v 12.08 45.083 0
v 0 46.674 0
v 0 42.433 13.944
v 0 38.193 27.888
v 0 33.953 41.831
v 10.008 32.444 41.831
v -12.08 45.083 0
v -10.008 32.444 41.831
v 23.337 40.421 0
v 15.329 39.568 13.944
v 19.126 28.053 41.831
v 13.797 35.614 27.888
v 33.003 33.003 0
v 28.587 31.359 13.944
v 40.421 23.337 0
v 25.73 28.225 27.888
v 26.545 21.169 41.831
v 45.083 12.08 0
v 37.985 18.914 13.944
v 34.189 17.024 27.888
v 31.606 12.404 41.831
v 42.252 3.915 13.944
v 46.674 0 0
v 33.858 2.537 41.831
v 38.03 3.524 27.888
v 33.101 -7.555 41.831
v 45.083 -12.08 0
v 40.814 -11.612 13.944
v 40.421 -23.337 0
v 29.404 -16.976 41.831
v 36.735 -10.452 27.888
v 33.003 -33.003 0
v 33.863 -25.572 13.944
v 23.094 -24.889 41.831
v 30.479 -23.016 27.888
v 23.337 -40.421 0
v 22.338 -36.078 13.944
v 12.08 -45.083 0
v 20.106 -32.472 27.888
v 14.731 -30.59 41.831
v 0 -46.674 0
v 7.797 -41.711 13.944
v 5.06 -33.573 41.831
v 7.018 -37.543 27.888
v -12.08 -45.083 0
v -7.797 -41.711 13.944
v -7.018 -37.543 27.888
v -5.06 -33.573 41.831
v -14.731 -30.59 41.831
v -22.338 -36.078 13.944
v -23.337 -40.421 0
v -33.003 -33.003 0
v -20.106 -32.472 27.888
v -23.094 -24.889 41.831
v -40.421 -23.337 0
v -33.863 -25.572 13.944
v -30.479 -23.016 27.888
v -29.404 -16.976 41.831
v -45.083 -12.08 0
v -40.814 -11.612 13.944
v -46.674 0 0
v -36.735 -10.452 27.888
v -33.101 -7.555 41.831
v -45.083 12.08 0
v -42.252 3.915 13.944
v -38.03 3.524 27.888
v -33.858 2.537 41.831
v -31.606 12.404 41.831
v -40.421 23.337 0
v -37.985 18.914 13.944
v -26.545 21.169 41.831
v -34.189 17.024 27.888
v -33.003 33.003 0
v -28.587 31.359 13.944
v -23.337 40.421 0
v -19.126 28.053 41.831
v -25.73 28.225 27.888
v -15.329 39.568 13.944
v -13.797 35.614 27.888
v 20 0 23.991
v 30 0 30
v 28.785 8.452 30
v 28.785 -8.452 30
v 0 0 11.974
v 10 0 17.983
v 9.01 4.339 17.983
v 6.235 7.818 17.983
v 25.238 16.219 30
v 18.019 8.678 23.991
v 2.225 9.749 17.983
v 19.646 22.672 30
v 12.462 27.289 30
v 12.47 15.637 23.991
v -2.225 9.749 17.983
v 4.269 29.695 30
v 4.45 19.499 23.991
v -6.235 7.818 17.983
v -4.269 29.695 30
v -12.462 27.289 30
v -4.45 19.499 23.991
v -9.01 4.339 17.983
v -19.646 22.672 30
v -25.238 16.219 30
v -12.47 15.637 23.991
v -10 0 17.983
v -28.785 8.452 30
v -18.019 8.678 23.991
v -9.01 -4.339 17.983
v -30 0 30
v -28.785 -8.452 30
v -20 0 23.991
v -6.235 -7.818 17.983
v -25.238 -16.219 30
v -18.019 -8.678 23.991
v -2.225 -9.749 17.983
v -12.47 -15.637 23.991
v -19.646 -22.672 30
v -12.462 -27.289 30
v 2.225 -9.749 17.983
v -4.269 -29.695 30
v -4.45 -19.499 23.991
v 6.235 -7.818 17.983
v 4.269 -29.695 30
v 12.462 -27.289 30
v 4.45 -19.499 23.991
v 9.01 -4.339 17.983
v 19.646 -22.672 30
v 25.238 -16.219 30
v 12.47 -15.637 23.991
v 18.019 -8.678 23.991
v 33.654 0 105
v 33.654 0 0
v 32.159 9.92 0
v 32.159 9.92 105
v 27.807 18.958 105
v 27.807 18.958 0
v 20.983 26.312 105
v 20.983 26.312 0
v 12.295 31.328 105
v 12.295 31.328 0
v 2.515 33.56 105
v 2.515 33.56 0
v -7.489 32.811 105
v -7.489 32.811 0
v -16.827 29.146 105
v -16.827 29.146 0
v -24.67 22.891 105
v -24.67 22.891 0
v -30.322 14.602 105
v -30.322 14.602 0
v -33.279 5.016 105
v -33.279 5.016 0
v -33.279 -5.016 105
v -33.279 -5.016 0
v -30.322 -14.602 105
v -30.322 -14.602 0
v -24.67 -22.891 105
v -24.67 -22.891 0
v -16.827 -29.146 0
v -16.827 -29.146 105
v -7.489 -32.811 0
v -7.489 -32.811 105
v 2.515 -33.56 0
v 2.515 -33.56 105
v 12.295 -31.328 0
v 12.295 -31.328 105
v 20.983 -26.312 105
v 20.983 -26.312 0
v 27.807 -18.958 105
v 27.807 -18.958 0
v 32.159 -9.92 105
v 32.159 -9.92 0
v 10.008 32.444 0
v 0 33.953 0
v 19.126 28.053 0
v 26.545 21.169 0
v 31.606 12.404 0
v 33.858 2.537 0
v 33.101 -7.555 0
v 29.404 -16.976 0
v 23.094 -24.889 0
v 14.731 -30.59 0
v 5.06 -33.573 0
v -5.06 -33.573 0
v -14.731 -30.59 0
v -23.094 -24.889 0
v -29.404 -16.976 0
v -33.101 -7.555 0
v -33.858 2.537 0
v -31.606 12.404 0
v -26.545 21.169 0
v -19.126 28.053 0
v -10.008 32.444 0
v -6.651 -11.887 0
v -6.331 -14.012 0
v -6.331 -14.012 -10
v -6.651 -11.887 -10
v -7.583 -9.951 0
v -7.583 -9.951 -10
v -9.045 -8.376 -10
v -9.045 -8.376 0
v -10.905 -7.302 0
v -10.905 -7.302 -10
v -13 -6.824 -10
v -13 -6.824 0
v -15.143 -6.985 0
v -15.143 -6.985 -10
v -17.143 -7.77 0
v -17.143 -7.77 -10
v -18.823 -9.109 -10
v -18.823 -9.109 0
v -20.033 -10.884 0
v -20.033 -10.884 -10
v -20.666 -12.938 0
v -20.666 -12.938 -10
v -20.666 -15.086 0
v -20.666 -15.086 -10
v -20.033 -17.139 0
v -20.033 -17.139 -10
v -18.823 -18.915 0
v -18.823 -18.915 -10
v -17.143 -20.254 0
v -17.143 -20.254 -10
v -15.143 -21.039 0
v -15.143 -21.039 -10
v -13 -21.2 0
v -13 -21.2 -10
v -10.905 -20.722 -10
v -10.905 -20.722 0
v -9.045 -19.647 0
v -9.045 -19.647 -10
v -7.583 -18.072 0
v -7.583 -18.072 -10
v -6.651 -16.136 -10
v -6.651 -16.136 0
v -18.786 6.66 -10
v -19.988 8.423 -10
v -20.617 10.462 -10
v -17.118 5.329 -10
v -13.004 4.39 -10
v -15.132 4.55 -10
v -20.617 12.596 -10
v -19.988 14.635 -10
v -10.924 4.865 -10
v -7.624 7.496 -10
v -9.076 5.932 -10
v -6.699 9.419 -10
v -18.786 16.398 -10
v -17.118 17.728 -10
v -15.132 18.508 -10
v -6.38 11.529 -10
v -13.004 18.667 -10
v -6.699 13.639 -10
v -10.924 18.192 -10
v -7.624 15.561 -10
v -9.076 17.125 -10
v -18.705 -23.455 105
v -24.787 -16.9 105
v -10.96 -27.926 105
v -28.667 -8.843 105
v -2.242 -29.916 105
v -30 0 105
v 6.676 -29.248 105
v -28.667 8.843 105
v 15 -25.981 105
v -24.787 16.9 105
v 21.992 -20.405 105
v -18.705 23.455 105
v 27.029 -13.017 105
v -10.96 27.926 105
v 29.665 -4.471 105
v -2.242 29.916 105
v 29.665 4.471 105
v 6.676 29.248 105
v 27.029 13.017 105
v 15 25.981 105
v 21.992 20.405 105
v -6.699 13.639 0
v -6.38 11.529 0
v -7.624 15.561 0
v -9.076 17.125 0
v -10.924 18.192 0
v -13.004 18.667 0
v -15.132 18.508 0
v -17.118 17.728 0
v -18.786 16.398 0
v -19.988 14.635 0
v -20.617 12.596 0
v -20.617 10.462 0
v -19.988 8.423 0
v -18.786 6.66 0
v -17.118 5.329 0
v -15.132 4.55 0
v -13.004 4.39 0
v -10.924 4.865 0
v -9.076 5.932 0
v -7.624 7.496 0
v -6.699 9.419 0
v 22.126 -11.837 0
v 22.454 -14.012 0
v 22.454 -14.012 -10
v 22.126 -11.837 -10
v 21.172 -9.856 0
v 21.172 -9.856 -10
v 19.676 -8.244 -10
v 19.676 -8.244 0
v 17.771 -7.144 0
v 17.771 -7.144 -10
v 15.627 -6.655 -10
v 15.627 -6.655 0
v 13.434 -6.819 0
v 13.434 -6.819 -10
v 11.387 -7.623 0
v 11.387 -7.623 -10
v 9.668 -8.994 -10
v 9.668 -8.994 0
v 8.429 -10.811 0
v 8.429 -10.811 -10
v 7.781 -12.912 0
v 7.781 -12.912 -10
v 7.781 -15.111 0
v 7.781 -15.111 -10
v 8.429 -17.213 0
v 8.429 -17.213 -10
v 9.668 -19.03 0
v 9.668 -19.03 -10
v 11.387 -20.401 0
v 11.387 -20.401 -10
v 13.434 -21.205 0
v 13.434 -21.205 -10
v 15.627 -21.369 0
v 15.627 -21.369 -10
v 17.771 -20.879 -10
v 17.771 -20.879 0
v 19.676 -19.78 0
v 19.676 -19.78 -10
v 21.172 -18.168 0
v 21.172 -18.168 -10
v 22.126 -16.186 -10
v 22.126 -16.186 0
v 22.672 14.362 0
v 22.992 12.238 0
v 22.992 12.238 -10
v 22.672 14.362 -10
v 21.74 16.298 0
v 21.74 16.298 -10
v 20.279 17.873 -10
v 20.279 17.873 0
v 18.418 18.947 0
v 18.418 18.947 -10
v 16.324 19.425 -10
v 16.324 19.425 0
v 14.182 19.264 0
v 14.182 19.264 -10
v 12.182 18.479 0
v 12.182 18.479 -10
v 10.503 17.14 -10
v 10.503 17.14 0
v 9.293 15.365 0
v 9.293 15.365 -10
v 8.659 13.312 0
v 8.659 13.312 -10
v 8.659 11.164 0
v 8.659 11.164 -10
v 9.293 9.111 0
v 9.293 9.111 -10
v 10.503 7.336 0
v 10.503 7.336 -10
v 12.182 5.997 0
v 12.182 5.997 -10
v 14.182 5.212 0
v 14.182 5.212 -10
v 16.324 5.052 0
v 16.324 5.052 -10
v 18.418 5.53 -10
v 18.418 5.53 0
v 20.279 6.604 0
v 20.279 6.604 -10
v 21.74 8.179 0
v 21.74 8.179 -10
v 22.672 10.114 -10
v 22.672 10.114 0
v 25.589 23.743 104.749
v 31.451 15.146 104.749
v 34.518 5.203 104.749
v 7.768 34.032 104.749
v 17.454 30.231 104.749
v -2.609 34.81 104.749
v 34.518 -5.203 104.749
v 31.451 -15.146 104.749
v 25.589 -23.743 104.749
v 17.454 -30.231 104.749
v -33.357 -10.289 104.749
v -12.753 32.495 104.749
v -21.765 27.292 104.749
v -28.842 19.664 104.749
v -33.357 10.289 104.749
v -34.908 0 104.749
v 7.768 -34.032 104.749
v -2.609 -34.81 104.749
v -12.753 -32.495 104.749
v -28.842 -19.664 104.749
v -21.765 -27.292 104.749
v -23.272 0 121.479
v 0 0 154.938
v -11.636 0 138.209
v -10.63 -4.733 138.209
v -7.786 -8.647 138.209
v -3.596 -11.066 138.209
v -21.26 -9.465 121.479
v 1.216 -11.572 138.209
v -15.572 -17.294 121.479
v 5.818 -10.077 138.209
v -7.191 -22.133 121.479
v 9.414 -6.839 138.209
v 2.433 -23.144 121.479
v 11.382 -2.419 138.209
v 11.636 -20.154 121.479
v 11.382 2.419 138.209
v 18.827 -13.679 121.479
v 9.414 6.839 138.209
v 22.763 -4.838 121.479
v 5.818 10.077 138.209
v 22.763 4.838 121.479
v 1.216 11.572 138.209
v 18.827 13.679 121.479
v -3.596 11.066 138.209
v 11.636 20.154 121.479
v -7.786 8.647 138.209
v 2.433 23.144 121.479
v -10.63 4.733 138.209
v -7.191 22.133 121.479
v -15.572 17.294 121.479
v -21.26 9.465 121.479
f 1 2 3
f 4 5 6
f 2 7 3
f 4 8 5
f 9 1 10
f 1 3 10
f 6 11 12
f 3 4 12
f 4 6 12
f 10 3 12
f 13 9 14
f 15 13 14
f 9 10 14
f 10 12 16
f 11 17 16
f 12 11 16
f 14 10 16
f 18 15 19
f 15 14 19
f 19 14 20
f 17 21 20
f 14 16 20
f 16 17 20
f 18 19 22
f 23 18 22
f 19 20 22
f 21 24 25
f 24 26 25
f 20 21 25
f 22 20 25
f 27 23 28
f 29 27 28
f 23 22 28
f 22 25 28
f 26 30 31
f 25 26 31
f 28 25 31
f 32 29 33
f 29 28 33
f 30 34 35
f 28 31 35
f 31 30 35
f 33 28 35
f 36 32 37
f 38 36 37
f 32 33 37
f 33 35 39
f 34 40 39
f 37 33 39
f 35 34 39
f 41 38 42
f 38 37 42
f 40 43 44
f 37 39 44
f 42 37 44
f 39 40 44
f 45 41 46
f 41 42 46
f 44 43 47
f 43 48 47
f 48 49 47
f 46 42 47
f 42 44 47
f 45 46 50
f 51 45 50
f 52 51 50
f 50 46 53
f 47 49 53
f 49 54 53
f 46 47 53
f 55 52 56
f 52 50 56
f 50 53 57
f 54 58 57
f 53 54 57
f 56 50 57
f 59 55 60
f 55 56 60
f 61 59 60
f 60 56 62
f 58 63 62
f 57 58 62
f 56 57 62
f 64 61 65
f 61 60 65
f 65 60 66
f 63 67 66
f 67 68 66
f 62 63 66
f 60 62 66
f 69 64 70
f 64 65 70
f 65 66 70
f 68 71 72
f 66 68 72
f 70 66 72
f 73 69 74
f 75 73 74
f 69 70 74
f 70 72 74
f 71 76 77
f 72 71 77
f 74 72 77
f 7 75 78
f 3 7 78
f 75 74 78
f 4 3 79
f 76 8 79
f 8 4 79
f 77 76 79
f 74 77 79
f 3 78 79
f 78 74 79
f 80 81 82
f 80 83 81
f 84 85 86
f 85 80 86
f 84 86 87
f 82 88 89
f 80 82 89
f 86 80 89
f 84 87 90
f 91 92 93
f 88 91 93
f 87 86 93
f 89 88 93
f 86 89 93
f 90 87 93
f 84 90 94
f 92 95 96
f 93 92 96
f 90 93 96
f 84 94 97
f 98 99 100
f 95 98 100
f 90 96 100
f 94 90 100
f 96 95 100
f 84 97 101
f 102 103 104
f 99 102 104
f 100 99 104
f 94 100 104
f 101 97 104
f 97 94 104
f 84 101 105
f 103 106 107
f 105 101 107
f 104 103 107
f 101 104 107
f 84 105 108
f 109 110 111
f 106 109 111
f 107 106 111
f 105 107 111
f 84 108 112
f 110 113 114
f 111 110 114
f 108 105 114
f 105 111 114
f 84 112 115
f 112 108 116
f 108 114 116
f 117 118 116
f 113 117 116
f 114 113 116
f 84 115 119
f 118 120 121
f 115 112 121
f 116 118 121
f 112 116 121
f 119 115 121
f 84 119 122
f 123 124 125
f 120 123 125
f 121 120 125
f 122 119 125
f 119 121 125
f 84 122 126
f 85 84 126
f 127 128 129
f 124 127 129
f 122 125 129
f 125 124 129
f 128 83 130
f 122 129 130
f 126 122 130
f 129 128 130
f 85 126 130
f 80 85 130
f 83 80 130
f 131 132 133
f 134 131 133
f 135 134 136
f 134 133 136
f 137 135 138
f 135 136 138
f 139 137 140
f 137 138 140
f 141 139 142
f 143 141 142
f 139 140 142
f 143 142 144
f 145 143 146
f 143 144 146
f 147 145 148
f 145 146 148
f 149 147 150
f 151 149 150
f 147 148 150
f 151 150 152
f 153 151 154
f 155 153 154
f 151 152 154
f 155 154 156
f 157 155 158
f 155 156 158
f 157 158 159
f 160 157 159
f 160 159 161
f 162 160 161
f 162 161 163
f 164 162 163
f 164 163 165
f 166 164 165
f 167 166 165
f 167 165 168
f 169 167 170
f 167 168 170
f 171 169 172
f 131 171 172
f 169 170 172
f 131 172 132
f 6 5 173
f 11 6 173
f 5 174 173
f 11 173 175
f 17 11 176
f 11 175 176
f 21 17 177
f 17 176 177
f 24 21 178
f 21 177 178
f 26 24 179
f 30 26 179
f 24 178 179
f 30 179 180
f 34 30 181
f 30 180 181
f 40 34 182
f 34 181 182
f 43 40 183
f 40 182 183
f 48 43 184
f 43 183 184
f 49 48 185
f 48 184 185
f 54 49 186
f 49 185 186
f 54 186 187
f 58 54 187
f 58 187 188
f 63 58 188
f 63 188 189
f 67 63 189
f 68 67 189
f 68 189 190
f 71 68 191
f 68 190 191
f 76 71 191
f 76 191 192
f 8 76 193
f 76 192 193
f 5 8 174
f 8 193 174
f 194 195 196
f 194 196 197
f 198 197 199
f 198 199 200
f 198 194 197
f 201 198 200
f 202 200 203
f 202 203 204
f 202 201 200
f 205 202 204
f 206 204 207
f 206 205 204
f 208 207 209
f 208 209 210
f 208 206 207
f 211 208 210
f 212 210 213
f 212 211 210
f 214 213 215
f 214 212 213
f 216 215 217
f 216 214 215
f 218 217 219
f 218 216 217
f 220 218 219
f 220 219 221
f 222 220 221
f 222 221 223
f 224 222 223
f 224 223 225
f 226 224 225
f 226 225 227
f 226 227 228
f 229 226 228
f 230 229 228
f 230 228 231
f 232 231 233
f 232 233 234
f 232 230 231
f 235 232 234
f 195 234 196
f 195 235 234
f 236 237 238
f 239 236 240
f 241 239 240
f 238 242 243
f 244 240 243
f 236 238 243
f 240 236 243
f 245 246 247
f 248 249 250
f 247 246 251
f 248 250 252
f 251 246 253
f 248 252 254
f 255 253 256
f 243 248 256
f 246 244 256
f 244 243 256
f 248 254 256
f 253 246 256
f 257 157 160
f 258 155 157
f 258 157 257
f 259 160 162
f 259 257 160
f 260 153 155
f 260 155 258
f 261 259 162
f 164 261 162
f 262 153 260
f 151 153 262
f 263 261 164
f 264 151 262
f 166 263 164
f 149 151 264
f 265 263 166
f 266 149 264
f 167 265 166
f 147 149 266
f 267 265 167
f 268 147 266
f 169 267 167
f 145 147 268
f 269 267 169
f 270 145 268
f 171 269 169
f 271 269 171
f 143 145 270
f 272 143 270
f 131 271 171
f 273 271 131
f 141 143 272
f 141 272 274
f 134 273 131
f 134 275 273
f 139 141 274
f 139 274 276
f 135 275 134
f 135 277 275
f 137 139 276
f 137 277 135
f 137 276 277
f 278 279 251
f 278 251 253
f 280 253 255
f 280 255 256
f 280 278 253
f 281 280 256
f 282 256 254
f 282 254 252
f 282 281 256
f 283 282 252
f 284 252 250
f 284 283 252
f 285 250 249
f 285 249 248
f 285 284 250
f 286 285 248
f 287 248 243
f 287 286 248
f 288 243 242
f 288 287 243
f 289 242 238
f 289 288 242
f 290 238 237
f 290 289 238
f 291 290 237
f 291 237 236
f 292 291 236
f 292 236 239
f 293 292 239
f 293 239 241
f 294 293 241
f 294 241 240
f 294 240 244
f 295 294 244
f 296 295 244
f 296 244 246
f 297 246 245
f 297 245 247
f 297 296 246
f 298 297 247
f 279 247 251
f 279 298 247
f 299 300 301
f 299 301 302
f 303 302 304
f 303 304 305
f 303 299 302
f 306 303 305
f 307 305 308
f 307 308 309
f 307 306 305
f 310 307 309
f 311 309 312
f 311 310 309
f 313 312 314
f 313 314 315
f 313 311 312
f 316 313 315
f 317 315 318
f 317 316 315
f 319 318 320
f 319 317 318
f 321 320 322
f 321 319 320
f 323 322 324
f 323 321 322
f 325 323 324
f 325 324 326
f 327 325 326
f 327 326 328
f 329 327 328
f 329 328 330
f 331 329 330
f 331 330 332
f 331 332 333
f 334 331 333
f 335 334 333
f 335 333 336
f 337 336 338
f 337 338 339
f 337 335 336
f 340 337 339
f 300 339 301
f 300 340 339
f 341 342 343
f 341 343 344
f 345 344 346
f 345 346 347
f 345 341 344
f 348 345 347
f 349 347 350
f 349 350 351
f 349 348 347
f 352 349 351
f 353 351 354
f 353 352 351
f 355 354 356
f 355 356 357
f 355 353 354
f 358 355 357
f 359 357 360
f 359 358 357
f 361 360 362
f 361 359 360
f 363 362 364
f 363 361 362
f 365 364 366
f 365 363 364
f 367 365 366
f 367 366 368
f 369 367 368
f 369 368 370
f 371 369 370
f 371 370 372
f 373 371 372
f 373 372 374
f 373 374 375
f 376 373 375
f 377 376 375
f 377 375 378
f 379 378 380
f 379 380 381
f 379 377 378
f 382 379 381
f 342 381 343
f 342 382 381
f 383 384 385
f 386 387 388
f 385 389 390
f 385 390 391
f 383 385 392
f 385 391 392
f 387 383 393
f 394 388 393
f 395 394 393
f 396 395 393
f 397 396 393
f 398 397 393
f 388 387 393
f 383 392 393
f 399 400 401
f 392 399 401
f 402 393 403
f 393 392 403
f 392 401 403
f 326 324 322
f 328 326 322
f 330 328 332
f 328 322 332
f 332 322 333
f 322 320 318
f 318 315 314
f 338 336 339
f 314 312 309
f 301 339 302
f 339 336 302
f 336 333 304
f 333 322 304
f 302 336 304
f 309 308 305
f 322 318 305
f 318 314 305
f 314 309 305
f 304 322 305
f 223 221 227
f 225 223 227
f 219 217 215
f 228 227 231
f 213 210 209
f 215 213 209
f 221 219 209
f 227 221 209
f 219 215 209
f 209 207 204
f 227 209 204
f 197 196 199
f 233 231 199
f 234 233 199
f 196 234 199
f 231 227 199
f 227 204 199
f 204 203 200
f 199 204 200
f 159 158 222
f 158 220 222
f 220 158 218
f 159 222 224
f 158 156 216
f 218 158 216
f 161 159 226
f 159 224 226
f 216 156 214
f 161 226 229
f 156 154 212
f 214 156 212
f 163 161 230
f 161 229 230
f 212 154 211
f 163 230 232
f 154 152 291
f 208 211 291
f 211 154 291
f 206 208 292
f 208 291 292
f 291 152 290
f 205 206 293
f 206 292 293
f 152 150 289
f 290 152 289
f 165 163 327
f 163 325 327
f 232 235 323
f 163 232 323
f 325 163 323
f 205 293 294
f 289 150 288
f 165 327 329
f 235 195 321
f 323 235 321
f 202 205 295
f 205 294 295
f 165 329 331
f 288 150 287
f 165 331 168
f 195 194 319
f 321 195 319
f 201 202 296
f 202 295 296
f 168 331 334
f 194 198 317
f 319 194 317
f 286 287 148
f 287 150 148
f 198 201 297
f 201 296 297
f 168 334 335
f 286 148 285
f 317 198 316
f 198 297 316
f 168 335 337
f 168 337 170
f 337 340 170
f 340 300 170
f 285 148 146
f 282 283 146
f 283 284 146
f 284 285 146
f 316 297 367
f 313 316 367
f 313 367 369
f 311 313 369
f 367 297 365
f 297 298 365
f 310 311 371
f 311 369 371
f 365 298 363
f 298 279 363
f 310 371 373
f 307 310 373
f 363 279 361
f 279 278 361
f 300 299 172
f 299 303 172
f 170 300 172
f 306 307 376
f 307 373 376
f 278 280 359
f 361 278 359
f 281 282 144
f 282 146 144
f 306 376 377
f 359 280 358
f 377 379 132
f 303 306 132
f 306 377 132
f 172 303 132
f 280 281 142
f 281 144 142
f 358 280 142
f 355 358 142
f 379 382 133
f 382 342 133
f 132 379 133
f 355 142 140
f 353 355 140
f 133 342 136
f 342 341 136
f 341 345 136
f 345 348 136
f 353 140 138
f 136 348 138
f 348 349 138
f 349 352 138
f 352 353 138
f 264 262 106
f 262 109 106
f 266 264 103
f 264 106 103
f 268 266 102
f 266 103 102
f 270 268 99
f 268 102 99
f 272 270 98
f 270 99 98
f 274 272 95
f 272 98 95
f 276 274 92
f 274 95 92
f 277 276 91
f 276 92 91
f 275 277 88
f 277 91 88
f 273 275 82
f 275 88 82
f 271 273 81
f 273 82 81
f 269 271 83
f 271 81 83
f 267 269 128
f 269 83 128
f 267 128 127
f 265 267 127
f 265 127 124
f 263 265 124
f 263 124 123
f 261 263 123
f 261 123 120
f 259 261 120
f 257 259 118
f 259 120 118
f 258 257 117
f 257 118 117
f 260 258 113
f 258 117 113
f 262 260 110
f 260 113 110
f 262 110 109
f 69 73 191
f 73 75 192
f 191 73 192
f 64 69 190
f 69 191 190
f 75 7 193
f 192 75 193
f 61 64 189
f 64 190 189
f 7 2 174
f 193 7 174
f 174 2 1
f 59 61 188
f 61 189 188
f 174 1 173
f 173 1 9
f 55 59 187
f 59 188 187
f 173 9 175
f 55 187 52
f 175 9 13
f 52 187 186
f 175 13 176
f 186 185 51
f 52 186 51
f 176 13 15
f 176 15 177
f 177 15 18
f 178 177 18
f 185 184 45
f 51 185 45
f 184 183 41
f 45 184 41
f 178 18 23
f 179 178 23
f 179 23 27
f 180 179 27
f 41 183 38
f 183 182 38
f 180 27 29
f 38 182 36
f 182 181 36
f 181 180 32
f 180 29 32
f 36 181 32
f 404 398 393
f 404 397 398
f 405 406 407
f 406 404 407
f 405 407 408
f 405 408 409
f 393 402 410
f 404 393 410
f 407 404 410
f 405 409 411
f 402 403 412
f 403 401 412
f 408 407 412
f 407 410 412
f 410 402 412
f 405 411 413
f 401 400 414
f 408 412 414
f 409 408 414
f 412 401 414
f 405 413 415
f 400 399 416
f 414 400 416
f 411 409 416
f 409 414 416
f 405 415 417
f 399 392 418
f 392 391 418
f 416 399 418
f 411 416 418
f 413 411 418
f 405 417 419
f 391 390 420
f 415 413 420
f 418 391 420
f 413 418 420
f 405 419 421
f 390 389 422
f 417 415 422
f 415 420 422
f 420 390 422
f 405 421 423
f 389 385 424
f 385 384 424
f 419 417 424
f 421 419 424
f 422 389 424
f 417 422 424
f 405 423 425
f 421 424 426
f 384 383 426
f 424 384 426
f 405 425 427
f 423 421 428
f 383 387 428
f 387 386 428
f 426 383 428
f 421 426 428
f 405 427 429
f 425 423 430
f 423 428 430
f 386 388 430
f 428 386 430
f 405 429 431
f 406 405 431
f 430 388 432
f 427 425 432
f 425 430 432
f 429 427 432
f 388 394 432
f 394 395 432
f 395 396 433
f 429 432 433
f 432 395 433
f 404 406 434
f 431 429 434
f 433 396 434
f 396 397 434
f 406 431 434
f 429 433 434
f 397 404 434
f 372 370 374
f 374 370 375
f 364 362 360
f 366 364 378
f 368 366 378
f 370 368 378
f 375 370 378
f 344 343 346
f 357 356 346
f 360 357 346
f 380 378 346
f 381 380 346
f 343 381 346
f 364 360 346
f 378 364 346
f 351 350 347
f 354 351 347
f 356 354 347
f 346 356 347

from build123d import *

# Parameters (mm, degrees)
F0_R      = 33.6543994883
F1_DEPTH  = 105
F3_D      = 60
F3_DEPTH  = 75
F3_TIP    = 18.0258185708
F8_R      = 7.377658539
F9_DEPTH  = 10
F10_R     = 7.1583566922
F11_DEPTH = 10
F12_R     = 7.206639497
F13_DEPTH = 10
F14_R     = 7.207990809
F15_DEPTH = 10


with BuildPart() as f1:
    # F0 (on Top) → F1 (new body)
    with BuildSketch(Plane.XY):
        Circle(F0_R)
    extrude(amount=F1_DEPTH)

    # F3
    with Locations(Plane.XY.offset(105)):
        with Locations((0, 0)):
            Hole(F3_D / 2, depth=F3_DEPTH)
            with Locations((0, 0, -(F3_DEPTH + F3_TIP / 2))):  # 118° drill point
                Cone(0, F3_D / 2, F3_TIP, mode=Mode.SUBTRACT)

    # F8 (on face) → F9 (join)
    with BuildSketch(Plane.XY):
        with Locations((15.0760132819, -14.0118245035)):
            Circle(F8_R)
    extrude(amount=-F9_DEPTH)

    # F10 (on face) → F11 (join)
    with BuildSketch(Plane.XY):
        with Locations((-13.5388514027, 11.5287164226)):
            Circle(F10_R)
    extrude(amount=-F11_DEPTH)

    # F12 (on face) → F13 (join)
    with BuildSketch(Plane.XY):
        with Locations((15.7854743302, 12.2381756082)):
            Circle(F12_R)
    extrude(amount=-F13_DEPTH)

    # F14 (on face) → F15 (join)
    with BuildSketch(Plane.XY):
        with Locations((-13.5388514027, -14.0118245035)):
            Circle(F14_R)
    extrude(amount=-F15_DEPTH)


with BuildPart() as f5:
    # F4 (on Front) → F5 (revolve)
    with BuildSketch(Plane.XZ):
        Polygon((-34.9076794685, 104.7491133213), (0, 104.7491133213), (0, 154.9383550882), align=None)
    revolve(axis=Axis((0, 0, 105), (0, 0, 1)))


with BuildPart() as f7:
    # F6 (on Right) → F7 (revolve)
    with BuildSketch(Plane.YZ):
        Polygon((33.9526087046, 41.8312810361), (33.9526087046, 0), (46.6738604009, 0), align=None)
    revolve(axis=Axis((0, 0, 0), (0, 0, -1)))


solid = Compound([f1.part, f5.part, f7.part])
